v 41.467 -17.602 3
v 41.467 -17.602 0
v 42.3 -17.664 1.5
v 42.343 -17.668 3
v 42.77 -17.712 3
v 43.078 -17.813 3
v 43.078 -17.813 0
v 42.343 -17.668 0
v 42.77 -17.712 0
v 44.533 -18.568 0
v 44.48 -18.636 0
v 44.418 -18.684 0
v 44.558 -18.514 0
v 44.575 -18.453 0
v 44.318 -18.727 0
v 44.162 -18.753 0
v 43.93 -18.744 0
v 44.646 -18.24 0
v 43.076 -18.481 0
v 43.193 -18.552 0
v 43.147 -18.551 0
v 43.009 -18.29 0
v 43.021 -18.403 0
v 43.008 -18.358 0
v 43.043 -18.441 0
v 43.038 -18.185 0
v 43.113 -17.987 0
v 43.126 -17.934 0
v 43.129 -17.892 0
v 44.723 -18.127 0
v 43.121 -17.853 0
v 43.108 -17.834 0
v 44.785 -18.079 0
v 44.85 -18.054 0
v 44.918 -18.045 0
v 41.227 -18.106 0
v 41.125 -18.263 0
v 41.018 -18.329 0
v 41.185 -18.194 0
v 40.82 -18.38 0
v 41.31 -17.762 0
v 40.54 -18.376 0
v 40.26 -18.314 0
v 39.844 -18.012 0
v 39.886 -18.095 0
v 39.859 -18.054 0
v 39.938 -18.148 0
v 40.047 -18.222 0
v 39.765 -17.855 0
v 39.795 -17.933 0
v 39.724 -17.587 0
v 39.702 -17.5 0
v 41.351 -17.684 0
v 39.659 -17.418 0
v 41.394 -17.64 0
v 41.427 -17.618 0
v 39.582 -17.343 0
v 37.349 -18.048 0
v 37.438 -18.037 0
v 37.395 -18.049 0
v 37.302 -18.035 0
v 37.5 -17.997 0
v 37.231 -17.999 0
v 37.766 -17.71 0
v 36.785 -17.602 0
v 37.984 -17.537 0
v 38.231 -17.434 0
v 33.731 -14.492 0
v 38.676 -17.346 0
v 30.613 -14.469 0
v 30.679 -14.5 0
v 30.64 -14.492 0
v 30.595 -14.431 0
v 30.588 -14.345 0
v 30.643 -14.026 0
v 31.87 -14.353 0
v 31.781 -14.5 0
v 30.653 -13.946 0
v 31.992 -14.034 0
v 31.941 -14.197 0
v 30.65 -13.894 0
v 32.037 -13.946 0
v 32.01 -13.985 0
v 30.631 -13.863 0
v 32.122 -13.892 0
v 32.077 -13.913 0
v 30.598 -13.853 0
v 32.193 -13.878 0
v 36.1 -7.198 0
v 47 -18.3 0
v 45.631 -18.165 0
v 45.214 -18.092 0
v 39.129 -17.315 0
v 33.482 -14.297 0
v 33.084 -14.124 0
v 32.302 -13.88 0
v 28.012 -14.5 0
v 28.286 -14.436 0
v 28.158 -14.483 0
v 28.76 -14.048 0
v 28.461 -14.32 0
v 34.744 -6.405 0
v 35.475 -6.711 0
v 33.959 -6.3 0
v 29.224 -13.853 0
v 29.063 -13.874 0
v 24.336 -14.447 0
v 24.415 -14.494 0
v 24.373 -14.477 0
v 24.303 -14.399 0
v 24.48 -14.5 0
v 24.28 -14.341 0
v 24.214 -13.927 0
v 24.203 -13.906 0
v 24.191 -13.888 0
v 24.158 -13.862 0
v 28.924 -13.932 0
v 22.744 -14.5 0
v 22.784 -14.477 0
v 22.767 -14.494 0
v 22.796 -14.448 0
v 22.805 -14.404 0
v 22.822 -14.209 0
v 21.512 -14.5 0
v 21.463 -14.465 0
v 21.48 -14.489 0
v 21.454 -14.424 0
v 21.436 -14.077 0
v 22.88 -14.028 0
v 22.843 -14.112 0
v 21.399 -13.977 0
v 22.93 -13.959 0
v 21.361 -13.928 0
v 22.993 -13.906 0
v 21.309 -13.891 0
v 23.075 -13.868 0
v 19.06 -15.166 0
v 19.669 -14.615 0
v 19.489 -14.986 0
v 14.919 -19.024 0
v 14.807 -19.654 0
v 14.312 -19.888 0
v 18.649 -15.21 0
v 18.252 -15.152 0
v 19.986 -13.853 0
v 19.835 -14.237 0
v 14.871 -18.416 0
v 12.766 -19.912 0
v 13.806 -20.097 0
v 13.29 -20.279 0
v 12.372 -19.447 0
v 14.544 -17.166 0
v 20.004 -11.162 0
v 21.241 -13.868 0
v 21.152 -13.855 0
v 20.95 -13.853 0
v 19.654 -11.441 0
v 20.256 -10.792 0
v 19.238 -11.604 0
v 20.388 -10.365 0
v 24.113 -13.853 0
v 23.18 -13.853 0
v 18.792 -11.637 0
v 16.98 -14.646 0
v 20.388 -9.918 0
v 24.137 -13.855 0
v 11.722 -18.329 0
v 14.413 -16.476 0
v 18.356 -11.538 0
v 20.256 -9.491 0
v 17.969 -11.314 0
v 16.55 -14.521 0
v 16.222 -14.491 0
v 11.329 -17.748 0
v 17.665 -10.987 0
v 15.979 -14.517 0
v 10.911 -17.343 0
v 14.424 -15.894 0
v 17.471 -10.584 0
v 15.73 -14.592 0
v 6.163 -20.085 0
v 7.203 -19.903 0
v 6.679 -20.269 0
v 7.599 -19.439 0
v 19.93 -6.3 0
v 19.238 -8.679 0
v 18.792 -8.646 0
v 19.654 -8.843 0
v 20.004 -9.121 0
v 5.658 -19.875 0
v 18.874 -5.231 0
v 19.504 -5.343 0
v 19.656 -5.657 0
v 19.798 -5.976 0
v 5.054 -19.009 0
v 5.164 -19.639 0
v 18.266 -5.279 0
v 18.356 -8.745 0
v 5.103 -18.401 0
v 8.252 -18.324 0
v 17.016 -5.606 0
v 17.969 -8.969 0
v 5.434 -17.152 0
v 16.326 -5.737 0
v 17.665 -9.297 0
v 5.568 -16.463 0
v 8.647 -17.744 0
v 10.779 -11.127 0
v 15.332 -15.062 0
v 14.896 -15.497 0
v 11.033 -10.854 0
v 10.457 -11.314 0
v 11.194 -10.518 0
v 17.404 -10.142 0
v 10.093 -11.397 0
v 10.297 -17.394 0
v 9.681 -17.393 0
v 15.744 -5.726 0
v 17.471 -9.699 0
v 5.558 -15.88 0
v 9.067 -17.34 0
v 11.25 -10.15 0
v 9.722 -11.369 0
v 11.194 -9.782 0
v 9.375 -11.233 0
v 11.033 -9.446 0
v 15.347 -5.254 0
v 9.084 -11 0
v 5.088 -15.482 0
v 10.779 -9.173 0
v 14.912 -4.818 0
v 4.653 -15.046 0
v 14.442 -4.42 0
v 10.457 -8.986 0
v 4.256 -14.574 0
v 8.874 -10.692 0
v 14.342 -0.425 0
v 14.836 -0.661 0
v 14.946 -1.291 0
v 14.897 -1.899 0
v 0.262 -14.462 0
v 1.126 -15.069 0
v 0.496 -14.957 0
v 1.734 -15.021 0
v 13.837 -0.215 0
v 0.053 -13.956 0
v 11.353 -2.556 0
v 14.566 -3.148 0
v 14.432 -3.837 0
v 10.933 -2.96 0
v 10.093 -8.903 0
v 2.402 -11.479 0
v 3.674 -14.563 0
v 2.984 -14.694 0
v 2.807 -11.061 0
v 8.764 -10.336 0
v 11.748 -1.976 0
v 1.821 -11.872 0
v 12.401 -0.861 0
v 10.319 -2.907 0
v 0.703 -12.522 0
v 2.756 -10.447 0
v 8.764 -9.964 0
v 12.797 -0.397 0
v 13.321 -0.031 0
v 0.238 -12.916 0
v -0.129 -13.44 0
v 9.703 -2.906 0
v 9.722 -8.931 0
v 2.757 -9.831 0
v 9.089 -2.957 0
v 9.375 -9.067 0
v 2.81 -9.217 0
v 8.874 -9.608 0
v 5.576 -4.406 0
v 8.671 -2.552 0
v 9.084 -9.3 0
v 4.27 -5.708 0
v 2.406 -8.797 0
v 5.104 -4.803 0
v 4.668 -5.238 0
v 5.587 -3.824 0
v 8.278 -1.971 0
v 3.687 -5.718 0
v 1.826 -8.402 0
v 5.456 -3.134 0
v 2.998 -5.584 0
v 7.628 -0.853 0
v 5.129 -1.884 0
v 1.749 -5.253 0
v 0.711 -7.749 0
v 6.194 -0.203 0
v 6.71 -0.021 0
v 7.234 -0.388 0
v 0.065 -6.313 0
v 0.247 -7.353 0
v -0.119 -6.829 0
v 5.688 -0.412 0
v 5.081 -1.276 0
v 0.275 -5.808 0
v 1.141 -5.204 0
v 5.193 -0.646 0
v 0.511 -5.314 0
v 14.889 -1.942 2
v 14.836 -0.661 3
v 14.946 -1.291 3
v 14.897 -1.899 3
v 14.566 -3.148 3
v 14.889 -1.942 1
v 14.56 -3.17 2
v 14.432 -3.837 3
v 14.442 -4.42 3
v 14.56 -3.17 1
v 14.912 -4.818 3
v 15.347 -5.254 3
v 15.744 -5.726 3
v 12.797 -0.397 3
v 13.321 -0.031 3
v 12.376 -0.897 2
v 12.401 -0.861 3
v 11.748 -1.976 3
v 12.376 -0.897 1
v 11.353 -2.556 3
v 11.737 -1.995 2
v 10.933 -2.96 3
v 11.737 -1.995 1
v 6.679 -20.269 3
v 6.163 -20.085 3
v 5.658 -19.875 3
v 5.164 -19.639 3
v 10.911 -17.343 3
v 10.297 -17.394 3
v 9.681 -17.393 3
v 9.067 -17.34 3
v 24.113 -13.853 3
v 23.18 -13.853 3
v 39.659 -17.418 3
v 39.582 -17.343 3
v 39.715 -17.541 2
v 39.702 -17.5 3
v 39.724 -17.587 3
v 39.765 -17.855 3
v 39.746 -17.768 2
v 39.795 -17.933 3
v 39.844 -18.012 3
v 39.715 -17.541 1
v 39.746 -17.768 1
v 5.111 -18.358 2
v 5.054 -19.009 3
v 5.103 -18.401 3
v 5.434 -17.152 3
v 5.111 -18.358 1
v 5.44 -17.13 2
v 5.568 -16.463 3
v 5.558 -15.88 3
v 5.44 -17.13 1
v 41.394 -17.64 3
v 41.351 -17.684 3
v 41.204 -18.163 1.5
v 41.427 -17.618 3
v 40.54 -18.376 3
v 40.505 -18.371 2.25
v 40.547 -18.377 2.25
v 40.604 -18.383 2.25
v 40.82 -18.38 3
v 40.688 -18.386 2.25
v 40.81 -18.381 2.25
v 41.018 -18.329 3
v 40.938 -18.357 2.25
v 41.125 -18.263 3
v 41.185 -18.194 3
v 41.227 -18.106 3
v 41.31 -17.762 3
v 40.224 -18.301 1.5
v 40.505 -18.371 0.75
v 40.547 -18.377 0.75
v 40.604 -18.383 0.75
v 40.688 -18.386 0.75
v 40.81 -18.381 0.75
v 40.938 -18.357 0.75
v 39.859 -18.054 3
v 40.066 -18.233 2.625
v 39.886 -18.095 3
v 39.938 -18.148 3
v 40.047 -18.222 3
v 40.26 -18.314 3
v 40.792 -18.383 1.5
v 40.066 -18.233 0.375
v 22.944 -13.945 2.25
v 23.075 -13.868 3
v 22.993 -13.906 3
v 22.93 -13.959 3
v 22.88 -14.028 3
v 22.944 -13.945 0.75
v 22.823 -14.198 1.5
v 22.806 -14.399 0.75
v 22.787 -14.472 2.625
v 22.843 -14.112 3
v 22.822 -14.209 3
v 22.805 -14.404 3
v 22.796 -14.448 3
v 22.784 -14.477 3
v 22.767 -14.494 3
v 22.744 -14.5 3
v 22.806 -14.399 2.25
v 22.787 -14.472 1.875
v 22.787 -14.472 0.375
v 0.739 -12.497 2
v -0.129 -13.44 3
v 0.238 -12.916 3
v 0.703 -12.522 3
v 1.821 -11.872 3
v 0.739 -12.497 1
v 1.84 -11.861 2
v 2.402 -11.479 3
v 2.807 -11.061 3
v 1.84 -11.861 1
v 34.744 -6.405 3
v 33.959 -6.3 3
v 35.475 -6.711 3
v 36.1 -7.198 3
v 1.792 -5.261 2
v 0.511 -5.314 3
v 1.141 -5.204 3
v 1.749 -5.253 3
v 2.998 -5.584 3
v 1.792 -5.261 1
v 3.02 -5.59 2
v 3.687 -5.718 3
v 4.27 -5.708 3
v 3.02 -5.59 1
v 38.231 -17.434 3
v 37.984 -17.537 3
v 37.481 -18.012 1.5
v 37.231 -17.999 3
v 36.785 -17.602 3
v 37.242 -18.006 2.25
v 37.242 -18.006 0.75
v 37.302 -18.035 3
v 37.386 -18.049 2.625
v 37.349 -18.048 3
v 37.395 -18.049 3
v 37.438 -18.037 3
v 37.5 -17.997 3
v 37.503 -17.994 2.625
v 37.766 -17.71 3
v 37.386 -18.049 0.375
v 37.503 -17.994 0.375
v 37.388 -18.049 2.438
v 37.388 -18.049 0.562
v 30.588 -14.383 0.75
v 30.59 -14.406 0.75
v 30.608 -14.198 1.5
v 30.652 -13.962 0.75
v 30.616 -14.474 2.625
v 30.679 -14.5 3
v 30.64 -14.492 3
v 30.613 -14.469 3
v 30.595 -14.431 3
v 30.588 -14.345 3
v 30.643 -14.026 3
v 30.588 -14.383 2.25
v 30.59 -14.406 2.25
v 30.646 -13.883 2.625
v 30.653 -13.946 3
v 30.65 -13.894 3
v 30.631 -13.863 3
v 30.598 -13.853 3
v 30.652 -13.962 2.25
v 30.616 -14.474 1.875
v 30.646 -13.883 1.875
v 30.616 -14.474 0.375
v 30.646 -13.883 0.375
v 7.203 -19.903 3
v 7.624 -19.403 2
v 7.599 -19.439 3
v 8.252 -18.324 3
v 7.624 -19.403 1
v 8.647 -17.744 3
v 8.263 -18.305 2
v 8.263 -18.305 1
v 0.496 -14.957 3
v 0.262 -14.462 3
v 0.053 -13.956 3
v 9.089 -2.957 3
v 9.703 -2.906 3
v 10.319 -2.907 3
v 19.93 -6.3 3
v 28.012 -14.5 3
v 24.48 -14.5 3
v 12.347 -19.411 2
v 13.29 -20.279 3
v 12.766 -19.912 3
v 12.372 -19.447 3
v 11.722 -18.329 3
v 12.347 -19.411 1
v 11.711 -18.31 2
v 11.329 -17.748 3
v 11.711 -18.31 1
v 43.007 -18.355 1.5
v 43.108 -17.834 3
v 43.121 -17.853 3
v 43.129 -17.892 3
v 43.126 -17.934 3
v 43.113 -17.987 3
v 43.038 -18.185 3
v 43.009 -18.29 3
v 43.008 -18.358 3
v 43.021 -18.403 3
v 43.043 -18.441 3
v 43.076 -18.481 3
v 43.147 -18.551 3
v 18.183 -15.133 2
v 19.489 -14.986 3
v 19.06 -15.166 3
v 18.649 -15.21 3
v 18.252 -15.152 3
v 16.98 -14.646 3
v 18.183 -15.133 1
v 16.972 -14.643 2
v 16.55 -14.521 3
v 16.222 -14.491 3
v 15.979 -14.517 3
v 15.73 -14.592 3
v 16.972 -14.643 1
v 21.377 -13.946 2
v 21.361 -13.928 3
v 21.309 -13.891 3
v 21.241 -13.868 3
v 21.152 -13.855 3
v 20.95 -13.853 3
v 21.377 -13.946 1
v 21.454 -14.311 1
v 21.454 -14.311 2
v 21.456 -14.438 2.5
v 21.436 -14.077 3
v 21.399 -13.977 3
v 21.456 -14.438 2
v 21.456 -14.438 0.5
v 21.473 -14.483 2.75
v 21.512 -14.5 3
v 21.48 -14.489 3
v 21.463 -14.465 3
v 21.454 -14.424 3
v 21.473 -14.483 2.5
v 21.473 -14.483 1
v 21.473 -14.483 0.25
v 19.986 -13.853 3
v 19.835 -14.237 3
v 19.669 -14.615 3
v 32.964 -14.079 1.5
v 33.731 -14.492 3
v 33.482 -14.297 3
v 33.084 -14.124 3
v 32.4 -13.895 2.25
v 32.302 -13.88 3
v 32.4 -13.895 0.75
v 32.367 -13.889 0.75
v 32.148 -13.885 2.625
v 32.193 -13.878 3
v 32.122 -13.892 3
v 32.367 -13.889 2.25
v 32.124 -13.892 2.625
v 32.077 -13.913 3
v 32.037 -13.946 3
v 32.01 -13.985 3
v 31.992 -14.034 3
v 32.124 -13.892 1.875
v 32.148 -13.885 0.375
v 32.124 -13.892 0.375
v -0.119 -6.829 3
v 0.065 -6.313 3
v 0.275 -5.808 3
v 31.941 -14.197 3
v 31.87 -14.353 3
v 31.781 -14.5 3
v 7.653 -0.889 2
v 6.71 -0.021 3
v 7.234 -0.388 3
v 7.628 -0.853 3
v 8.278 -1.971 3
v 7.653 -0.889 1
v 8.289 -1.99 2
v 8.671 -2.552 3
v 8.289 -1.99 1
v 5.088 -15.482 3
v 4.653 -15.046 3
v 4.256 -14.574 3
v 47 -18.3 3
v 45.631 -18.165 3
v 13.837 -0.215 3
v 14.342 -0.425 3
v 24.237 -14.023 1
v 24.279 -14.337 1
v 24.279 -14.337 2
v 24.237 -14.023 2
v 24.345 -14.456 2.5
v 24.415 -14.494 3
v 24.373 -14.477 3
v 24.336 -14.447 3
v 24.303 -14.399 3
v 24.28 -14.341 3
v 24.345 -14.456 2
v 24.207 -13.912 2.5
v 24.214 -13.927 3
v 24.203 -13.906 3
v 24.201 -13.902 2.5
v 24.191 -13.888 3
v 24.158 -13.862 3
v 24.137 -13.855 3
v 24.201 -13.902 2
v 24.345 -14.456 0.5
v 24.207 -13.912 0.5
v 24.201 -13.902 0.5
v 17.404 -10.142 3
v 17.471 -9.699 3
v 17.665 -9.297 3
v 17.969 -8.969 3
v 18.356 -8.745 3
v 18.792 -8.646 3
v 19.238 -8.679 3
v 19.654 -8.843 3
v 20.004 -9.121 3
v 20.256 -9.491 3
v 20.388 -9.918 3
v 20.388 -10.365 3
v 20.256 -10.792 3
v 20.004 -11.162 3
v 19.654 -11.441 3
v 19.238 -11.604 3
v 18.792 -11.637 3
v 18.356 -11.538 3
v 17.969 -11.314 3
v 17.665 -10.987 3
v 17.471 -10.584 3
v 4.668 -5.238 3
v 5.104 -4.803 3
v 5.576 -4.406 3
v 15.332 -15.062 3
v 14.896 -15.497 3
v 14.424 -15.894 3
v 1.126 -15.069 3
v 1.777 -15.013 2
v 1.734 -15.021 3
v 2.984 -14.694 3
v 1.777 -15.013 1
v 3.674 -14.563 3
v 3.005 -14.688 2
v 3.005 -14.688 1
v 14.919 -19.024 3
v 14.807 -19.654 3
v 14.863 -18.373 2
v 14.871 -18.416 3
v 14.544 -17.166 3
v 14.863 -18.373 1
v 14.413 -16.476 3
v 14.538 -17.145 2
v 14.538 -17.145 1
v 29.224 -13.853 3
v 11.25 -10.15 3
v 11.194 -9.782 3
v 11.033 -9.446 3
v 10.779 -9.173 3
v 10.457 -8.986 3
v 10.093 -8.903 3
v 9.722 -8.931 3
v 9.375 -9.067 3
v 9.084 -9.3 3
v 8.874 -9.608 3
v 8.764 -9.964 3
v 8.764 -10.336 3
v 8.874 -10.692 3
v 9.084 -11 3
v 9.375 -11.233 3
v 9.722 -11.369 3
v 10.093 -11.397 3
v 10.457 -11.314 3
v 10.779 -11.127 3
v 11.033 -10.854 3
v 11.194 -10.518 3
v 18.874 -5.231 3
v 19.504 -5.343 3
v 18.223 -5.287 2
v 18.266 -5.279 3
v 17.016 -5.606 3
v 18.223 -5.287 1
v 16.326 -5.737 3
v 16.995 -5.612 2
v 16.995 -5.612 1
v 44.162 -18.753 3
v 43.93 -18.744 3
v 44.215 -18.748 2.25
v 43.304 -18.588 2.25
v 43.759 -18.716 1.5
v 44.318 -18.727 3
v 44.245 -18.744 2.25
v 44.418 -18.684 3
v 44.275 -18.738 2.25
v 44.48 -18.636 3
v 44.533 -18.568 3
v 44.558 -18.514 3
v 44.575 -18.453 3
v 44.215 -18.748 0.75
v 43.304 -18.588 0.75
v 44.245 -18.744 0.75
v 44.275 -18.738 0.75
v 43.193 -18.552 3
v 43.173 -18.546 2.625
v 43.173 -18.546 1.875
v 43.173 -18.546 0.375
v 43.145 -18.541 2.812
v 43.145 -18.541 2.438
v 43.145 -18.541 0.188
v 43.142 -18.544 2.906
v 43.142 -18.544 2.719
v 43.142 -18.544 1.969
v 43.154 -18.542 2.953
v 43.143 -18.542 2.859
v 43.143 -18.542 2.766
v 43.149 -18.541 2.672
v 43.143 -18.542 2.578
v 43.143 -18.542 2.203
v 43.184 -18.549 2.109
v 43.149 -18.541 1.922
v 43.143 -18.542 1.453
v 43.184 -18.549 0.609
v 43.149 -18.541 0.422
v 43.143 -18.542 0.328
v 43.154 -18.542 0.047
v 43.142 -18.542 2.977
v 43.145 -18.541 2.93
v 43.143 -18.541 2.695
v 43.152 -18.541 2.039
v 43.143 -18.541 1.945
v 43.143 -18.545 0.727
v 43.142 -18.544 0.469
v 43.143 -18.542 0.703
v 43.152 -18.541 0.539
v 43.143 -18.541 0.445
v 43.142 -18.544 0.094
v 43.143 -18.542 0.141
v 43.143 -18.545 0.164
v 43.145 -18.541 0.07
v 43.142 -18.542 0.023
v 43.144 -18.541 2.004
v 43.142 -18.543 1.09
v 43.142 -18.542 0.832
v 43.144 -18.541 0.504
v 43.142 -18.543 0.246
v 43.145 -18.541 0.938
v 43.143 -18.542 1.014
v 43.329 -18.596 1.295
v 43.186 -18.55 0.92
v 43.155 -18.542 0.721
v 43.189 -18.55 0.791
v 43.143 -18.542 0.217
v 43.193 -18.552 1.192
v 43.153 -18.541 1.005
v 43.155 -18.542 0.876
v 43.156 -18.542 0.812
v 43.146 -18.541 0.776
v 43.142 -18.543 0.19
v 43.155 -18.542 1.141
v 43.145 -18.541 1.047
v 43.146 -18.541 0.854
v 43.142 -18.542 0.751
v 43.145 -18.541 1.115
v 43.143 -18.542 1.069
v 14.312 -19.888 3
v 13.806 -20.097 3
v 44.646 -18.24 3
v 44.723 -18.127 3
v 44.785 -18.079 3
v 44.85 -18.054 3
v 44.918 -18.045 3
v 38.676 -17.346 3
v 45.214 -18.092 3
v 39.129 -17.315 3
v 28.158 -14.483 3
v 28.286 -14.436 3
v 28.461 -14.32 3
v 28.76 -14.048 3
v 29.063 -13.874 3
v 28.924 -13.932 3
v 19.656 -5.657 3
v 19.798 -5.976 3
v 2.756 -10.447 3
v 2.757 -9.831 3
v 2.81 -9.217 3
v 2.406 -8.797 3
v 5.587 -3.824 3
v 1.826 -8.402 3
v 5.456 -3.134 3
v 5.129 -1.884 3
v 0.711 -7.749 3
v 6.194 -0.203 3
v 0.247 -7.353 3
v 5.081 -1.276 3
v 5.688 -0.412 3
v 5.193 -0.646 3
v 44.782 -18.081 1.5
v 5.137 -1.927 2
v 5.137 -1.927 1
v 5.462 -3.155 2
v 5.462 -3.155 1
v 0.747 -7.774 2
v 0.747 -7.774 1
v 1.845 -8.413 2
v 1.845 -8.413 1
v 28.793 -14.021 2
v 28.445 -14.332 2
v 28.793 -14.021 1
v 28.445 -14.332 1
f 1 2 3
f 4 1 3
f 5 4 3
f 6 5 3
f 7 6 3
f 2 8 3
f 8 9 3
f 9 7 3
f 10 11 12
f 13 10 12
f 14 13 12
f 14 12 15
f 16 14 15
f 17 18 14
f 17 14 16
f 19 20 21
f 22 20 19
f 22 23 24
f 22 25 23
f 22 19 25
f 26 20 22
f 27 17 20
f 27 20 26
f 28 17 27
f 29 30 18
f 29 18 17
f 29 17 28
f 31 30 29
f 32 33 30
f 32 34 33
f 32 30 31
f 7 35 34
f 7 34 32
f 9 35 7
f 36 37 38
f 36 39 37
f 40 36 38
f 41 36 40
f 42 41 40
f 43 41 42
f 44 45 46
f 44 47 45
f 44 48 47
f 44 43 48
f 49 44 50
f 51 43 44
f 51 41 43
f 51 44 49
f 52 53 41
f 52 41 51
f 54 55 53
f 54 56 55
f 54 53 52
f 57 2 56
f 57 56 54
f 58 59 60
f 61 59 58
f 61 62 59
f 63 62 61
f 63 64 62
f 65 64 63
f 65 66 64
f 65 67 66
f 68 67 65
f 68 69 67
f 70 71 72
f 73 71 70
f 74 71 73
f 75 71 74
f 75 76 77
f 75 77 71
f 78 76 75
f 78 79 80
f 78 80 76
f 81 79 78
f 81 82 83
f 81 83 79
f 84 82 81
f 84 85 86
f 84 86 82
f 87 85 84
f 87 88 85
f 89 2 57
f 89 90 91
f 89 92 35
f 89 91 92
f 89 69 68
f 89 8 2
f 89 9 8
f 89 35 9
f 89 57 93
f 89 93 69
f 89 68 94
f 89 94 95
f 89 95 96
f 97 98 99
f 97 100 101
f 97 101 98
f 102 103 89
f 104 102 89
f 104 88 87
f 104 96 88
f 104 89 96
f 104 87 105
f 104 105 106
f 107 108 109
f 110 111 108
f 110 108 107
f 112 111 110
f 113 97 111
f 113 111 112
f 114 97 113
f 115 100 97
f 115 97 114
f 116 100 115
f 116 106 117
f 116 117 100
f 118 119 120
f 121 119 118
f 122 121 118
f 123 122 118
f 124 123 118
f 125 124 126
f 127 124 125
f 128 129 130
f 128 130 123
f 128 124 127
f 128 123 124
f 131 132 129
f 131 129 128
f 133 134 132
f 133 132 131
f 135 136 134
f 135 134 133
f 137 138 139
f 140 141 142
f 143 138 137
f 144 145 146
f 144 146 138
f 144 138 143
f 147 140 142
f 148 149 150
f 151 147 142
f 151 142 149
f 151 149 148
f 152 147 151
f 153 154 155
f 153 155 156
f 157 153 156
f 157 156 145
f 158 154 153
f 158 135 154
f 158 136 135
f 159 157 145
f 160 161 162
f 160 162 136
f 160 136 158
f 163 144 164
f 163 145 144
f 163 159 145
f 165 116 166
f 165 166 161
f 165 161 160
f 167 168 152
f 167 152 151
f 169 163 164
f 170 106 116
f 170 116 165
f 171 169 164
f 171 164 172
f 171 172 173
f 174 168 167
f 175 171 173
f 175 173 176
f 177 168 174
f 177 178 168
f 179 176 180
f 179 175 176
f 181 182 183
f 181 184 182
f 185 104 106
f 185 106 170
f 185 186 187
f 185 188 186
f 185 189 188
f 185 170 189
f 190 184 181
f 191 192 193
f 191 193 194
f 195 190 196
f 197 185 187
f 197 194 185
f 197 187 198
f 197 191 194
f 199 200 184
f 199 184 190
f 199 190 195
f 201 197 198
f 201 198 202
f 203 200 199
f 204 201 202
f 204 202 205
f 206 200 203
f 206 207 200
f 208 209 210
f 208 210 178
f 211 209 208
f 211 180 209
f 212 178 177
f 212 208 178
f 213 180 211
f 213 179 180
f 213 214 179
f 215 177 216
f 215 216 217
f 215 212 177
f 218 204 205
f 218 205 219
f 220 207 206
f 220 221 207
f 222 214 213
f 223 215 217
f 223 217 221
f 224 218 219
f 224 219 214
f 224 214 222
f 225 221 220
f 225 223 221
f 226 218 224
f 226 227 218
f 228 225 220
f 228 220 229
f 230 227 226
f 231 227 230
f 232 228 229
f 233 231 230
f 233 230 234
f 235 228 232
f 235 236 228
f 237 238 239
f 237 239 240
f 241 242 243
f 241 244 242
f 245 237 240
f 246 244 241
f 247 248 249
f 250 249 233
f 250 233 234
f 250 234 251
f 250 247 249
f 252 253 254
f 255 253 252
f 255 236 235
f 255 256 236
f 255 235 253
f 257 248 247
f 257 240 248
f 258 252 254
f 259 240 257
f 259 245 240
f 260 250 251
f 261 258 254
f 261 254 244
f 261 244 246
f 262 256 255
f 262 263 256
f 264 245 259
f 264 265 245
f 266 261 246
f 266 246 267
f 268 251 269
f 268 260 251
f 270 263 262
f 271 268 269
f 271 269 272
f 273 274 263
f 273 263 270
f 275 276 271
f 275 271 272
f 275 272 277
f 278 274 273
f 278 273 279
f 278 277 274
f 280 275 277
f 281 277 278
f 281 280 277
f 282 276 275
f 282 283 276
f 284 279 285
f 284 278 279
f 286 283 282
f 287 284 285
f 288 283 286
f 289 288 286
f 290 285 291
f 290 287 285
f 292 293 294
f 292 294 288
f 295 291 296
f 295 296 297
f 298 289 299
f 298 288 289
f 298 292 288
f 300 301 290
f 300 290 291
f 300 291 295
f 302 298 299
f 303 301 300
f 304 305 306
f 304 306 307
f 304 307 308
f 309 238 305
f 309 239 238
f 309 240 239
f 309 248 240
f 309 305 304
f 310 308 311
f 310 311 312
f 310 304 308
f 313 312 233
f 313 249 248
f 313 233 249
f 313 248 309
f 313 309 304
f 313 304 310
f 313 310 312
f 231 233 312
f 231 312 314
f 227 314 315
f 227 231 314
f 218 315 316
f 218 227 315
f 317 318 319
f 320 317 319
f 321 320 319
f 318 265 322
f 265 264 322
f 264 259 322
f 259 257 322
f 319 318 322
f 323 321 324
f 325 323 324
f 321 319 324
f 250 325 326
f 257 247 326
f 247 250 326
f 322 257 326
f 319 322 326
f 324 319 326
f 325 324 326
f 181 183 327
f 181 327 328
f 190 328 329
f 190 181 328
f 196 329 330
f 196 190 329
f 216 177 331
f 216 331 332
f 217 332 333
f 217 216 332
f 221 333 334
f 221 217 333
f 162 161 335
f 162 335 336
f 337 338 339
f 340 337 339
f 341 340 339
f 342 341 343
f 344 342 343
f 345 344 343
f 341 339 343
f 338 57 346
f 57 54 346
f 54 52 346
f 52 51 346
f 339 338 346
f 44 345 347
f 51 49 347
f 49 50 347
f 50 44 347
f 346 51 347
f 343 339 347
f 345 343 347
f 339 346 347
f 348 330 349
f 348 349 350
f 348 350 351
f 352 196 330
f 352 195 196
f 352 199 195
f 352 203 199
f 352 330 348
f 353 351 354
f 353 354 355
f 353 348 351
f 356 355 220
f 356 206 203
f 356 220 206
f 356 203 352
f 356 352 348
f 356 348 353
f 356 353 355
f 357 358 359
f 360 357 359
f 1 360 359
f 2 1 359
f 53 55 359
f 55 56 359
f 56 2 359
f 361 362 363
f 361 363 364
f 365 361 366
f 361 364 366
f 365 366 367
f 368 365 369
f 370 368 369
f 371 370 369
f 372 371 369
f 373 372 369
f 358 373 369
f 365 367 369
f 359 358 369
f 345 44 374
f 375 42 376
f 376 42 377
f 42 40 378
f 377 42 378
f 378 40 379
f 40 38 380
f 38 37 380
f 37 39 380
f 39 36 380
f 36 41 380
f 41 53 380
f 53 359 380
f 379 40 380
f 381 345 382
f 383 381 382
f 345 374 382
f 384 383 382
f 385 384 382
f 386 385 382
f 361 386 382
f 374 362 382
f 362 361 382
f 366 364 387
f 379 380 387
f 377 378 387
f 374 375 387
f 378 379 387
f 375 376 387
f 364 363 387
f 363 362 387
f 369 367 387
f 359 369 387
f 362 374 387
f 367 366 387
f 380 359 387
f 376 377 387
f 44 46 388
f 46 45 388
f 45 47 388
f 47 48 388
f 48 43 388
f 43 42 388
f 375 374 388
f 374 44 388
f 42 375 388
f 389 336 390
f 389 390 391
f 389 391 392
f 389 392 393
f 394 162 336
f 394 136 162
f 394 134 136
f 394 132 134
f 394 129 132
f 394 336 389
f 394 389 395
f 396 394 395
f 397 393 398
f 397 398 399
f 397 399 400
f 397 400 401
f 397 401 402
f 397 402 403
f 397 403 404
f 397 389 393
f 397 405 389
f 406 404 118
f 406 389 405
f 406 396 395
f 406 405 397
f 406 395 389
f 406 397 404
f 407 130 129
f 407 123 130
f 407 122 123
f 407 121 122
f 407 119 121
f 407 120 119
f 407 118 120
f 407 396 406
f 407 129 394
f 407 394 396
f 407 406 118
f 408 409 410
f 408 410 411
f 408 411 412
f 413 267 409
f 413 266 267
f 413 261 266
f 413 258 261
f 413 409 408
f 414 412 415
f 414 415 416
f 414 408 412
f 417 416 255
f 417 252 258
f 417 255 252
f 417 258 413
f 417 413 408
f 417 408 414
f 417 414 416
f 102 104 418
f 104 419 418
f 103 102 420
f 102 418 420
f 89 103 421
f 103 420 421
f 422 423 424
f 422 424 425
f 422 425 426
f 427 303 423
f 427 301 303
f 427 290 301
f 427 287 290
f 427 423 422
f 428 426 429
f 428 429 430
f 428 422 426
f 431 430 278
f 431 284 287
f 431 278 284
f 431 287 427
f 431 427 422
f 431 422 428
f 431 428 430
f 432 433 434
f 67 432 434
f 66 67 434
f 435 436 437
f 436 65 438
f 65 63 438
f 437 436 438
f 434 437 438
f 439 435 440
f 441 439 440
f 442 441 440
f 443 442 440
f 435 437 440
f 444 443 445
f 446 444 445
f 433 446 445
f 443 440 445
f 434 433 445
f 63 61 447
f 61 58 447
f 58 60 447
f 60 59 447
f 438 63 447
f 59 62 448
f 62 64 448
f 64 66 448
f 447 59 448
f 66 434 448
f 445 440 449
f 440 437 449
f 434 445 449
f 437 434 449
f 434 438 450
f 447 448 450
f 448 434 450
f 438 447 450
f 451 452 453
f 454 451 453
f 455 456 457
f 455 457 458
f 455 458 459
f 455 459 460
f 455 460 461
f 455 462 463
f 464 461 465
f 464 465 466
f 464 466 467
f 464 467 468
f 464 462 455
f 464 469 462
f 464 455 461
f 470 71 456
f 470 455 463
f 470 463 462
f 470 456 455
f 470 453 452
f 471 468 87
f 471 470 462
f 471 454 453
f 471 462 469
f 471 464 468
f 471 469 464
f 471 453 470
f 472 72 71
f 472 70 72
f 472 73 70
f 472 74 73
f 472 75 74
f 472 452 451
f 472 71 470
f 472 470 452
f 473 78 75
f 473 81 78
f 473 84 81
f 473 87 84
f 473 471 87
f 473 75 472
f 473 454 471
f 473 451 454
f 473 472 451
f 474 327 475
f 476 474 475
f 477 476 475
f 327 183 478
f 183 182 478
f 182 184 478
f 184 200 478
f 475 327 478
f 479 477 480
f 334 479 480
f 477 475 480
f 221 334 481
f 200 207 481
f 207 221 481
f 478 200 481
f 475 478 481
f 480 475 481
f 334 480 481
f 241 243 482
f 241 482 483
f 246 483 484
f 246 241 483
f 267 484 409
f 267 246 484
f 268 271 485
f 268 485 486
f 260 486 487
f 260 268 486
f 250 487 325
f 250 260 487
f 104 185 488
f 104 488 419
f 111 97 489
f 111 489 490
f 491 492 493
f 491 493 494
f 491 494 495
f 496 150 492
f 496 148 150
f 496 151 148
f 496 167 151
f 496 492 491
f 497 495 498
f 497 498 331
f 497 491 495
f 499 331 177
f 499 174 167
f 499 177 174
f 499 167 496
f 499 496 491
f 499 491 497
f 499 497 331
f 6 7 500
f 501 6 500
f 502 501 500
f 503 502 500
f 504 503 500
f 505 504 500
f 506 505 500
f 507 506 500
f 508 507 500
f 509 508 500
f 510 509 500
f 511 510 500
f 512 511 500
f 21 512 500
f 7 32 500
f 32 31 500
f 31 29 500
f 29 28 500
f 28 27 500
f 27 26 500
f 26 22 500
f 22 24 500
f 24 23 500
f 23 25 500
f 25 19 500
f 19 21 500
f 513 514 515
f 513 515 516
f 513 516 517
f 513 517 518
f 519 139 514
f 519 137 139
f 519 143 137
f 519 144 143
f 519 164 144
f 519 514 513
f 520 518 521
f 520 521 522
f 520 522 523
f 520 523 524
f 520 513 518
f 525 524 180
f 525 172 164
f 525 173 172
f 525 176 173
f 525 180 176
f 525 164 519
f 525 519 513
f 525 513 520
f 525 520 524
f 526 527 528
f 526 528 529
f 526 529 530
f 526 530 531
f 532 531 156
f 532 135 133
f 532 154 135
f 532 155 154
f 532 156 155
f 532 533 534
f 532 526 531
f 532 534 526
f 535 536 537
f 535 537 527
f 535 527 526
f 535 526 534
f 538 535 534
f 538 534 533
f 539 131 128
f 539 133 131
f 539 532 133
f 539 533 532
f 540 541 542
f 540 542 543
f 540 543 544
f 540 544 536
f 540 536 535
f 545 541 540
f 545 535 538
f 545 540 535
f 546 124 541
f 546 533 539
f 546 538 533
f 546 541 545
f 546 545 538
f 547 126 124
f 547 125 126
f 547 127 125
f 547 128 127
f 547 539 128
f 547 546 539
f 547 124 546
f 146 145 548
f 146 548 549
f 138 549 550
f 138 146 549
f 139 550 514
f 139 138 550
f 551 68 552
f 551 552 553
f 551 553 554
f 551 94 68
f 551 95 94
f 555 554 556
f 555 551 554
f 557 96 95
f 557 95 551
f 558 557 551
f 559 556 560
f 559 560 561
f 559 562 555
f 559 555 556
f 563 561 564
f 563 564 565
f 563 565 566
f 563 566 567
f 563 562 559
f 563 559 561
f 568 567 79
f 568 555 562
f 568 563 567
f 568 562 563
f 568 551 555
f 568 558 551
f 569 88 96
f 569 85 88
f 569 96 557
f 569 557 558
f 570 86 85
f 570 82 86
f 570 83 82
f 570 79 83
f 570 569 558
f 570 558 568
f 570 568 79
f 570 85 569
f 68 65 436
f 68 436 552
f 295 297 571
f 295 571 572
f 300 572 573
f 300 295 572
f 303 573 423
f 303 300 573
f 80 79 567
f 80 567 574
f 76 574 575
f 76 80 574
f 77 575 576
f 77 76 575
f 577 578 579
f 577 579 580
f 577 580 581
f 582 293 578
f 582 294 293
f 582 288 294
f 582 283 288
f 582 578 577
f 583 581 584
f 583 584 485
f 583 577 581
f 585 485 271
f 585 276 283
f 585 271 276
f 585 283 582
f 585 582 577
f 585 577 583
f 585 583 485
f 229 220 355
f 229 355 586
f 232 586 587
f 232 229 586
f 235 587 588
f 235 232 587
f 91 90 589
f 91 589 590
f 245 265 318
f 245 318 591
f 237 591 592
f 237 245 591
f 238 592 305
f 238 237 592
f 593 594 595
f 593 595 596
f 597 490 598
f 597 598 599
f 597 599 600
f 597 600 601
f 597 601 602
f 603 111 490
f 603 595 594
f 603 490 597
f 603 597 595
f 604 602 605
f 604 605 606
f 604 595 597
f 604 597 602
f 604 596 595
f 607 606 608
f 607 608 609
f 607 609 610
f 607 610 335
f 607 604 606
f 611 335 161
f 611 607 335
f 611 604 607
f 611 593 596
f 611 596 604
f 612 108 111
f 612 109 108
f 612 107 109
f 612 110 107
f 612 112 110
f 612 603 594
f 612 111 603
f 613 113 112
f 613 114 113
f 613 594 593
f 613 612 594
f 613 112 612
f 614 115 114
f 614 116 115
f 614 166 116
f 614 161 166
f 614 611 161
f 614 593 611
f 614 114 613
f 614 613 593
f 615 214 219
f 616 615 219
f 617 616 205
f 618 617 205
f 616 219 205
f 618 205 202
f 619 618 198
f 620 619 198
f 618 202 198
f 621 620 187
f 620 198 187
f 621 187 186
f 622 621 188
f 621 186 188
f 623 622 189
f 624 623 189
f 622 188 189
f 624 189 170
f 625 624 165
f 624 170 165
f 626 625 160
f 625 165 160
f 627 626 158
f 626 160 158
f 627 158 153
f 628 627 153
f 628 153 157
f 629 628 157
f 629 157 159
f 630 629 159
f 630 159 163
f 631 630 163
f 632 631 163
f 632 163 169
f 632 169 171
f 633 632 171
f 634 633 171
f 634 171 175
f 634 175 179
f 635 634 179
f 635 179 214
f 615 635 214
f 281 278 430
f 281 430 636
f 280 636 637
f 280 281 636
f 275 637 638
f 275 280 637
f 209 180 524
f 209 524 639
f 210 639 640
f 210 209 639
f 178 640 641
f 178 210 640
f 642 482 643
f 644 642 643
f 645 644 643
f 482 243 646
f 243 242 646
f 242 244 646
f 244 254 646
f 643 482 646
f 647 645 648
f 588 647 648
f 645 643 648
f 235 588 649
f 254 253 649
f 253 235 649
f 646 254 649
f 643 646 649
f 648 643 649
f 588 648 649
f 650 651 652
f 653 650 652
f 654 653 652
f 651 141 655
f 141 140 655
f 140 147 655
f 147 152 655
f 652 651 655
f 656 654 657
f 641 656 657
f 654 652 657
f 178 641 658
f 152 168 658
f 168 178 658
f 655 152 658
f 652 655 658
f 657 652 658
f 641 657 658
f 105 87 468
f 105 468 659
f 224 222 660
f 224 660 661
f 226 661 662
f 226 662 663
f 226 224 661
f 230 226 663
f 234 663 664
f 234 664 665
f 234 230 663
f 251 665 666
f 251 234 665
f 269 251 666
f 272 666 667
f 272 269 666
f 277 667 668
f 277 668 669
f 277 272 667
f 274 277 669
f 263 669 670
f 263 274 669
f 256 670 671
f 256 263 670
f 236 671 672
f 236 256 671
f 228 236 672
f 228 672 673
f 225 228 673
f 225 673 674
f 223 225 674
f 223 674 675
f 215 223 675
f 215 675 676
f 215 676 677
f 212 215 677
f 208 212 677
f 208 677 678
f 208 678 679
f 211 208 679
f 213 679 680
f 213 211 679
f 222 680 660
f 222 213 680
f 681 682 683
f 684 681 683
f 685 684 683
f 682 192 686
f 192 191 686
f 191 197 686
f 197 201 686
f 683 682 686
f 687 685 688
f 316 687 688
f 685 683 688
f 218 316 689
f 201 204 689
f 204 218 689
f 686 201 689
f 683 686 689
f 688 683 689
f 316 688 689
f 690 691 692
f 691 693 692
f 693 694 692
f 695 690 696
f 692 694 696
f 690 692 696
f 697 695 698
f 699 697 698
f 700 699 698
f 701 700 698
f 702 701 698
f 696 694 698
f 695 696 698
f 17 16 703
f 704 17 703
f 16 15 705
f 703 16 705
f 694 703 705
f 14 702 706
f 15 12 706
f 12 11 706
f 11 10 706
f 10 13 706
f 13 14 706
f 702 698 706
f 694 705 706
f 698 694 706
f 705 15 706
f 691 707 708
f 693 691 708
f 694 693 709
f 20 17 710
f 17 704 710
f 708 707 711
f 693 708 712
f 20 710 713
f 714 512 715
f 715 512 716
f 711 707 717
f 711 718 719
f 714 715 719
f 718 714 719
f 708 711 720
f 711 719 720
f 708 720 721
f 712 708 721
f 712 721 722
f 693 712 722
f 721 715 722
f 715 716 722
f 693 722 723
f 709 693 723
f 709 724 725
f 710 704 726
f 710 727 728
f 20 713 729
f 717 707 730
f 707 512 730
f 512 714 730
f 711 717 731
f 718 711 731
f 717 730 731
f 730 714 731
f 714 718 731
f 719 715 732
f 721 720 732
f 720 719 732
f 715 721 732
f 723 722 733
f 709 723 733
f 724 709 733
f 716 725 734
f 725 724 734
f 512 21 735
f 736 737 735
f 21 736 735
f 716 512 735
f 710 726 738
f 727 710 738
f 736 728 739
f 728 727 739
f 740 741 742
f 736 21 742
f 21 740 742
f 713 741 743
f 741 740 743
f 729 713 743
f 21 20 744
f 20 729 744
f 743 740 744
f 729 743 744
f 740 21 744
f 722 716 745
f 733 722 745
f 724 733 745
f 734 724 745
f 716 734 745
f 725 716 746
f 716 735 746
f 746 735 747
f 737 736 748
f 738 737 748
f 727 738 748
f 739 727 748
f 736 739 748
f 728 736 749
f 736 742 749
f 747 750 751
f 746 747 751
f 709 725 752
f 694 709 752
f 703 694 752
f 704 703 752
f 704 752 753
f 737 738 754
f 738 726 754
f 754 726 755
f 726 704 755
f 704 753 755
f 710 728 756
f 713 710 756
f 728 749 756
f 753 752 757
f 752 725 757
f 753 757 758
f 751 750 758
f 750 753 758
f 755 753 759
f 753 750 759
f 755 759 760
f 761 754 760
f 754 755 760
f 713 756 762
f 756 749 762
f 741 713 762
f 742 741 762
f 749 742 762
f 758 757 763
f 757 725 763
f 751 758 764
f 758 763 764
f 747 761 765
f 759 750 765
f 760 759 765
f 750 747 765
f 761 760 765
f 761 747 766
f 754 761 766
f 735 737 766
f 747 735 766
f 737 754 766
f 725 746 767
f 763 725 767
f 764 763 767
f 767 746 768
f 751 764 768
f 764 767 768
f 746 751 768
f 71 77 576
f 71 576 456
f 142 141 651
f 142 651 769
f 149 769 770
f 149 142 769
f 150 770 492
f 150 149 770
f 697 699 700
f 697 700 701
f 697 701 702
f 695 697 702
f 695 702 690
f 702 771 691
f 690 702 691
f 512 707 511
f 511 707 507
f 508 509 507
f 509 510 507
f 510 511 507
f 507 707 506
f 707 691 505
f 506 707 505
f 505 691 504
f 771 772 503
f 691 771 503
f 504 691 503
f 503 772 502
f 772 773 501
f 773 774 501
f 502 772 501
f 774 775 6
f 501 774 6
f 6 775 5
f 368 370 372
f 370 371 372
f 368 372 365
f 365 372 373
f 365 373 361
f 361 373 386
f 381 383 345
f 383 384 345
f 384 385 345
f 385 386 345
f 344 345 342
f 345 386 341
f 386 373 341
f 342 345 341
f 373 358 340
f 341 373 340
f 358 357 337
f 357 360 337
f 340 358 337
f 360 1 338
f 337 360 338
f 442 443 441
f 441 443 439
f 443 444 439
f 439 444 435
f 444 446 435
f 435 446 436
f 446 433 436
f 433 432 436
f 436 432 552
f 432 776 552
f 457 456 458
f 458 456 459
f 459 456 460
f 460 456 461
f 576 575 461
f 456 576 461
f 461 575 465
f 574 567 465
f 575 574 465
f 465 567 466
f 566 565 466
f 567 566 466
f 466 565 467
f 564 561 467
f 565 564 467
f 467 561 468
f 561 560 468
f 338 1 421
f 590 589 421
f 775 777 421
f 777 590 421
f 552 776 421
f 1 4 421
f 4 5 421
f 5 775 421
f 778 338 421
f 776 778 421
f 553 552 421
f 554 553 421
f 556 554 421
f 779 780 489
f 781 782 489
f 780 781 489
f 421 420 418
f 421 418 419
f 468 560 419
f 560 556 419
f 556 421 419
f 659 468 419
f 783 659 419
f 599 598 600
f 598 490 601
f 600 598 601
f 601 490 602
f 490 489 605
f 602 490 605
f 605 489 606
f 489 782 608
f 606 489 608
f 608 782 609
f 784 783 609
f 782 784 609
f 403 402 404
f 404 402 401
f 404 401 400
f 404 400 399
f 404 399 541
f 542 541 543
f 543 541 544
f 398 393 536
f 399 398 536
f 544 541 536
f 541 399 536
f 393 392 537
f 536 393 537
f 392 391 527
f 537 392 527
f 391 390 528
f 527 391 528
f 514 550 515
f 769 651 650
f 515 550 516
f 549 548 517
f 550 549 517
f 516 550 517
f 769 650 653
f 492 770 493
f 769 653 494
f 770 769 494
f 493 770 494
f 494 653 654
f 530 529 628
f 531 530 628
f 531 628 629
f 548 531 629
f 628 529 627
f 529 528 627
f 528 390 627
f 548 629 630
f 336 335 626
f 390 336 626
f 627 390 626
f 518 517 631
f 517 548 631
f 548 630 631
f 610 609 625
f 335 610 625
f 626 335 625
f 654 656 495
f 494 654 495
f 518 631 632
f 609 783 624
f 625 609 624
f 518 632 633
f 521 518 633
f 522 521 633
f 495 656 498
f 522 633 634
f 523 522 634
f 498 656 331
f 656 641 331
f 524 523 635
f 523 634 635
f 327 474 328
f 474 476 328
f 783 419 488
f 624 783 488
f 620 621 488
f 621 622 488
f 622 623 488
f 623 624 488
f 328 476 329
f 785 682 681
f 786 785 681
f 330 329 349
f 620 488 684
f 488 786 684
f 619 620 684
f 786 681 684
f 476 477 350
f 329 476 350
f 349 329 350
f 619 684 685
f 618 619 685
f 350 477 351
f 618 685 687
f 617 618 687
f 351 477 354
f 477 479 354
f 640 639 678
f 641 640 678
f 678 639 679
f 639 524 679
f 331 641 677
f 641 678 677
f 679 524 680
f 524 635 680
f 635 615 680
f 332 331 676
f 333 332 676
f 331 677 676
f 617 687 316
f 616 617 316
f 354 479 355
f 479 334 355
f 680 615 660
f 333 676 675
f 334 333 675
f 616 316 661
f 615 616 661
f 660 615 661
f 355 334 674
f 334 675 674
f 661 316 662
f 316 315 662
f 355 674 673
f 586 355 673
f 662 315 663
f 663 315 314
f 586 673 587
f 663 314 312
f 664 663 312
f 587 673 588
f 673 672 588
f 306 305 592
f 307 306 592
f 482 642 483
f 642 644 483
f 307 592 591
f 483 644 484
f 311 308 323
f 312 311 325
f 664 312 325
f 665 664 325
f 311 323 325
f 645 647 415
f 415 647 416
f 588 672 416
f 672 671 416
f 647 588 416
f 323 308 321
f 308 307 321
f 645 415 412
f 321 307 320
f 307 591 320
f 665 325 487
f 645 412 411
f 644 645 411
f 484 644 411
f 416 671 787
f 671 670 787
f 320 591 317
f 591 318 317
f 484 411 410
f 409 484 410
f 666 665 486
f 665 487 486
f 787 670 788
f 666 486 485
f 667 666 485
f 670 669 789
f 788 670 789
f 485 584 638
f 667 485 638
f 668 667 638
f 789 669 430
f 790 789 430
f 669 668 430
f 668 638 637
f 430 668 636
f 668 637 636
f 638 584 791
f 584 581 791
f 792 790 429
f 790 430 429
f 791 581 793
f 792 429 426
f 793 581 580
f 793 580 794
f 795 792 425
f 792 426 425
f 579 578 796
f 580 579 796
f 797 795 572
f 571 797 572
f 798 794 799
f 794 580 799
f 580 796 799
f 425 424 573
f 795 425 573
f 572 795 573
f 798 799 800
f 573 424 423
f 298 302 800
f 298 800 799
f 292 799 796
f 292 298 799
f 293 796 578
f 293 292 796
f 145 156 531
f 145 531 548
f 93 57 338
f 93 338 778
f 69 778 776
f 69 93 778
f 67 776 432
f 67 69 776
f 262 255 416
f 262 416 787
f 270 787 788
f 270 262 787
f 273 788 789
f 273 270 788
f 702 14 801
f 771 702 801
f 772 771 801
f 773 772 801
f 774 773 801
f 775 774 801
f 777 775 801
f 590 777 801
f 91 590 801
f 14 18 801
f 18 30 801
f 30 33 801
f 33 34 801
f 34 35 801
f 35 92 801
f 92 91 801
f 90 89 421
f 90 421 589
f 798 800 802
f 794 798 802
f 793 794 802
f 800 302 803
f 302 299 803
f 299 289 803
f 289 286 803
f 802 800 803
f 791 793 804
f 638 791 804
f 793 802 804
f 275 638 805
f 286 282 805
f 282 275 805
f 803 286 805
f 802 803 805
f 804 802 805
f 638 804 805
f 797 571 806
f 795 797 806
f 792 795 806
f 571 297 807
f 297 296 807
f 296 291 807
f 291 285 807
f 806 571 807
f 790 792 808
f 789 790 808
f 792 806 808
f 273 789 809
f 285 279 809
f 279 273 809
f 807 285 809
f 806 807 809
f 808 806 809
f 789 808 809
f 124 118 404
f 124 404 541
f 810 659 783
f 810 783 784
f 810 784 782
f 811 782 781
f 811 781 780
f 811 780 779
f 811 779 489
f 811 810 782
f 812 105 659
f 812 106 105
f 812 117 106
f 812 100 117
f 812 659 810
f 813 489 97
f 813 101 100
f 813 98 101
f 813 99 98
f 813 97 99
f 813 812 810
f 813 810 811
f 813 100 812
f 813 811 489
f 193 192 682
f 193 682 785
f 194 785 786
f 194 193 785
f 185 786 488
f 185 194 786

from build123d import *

# Parameters (mm, degrees)
ESQUISSE1_R             = 1.25
BOSS_EXTRU_1_DEPTH      = 3
CONG_1_R                = 3
ESQUISSE2_R             = 1.5
ENL_V_MAT_EXTRU_1_DEPTH = 10


with BuildPart() as part:
    # Esquisse1 → Boss.-Extru.1 (new body)
    with BuildSketch(Plane.XY):
        with BuildLine():
            Line((19.92975327, -6.3), (35.217971298, -6.3))
            Line((35.217971298, -6.3), (47, -18.3))
            Line((47, -18.3), (45.631202596, -18.164866086))
            add(Edge.make_bspline(
                [(44.574765673, -18.453081845), (44.609849099, -18.278093463), (44.810570852, -17.89677836), (45.205219796, -18.122811123), (45.631202596, -18.164866086)],
                knots=[0, 0, 0, 0, 0.363922375, 1, 1, 1, 1], degree=3))
            add(Edge.make_bspline(
                [(43.14719525, -18.550945105), (43.09751522, -18.50205817), (43.730894007, -18.788269797), (44.507224039, -18.789964599), (44.574765673, -18.453081845)],
                knots=[0, 0, 0, 0, 0.494582685, 1, 1, 1, 1], degree=3))
            add(Edge.make_bspline(
                [(43.078110836, -17.813160677), (43.233086748, -17.882249489), (42.868812221, -18.319185258), (43.087477408, -18.492180602), (43.14719525, -18.550945105)],
                knots=[0, 0, 0, 0, 0.680948688, 1, 1, 1, 1], degree=3))
            add(Edge.make_bspline(
                [(41.466586273, -17.601888285), (41.504069337, -17.589909306), (42.505756712, -17.693836279), (42.799520207, -17.688963985), (43.078110836, -17.813160677)],
                knots=[0, 0, 0, 0, 0.477700623, 1, 1, 1, 1], degree=3))
            add(Edge.make_bspline(
                [(39.844270523, -18.01177052), (39.904616243, -18.313831866), (41.426666849, -18.718352059), (41.243571394, -17.673160221), (41.466586273, -17.601888285)],
                knots=[0, 0, 0, 0, 0.705660207, 1, 1, 1, 1], degree=3))
            add(Edge.make_bspline(
                [(39.582059604, -17.342538581), (39.82174321, -17.521996239), (39.65531727, -17.763700919), (39.844270523, -18.01177052)],
                knots=[0, 0, 0, 0, 1, 1, 1, 1], degree=3))
            ThreePointArc((39.582059604, -17.342538581), (38.901892941, -17.323195475), (38.230573756, -17.434242297))
            add(Edge.make_bspline(
                [(36.784856269, -17.601888285), (37.210480557, -18.035386759), (37.505799664, -18.195146881), (37.795231884, -17.550105131), (38.230573756, -17.434242297)],
                knots=[0, 0, 0, 0, 0.460710551, 1, 1, 1, 1], degree=3))
            Line((36.784856269, -17.601888285), (33.731487311, -14.492031025))
            add(Edge.make_bspline(
                [(33.731487311, -14.492031025), (33.514450956, -14.270979429), (33.057221931, -14.130586993), (32.069360868, -13.726488082), (31.99227695, -14.033778698)],
                knots=[0, 0, 0, 0, 0.472738977, 1, 1, 1, 1], degree=3))
            ThreePointArc((31.99227695, -14.033778698), (31.907533679, -14.27645853), (31.780631614, -14.5))
            Line((31.780631614, -14.5), (30.678819449, -14.5))
            add(Edge.make_bspline(
                [(30.678819449, -14.5), (30.566879888, -14.5), (30.590912004, -14.184943581), (30.696767567, -13.852950327), (30.597609057, -13.852950327)],
                knots=[0, 0, 0, 0, 0.4739837, 1, 1, 1, 1], degree=3))
            Line((30.597609057, -13.852950327), (29.223744999, -13.852950327))
            add(Edge.make_bspline(
                [(29.223744999, -13.852950327), (28.69642769, -13.852950327), (28.543913483, -14.5), (28.011775663, -14.5)],
                knots=[0, 0, 0, 0, 1, 1, 1, 1], degree=3))
            Line((28.011775663, -14.5), (24.480450971, -14.5))
            add(Edge.make_bspline(
                [(24.480450971, -14.5), (24.119134276, -14.511094497), (24.35906075, -13.852950327), (24.113474847, -13.852950327)],
                knots=[0, 0, 0, 0, 0.869021917, 0.869021917, 0.869021917, 0.869021917], degree=3))
            Line((24.113474847, -13.852950327), (23.179553753, -13.852950327))
            add(Edge.make_bspline(
                [(23.179553753, -13.852950327), (22.992119455, -13.852950327), (22.770536848, -14.066530423), (22.823007832, -14.5), (22.744283986, -14.5)],
                knots=[0, 0, 0, 0, 0.61315008, 1, 1, 1, 1], degree=3))
            Line((22.744283986, -14.5), (21.51212894, -14.5))
            add(Edge.make_bspline(
                [(21.51212894, -14.5), (21.442415292, -14.5), (21.471474766, -14.175360412), (21.388427589, -13.83637058), (21.143014821, -13.852950327), (20.950444947, -13.852950327)],
                knots=[0, 0, 0, 0, 0.152029745, 0.482763063, 1, 1, 1, 1], degree=3))
            Line((20.950444947, -13.852950327), (19.985522464, -13.852950327))
            ThreePointArc((19.985522464, -13.852950327), (19.75349781, -14.426889112), (19.488517244, -14.986376796))
            add(Edge.make_bspline(
                [(19.488517244, -14.986376796), (18.093314004, -15.809671906), (17.029637143, -14.066327863), (15.730054573, -14.591731036)],
                knots=[0, 0, 0, 0, 1, 1, 1, 1], degree=3))
            ThreePointArc((15.730054573, -14.591731036), (15.118510747, -15.284525074), (14.42380974, -15.893901756))
            add(Edge.make_bspline(
                [(14.806712838, -19.653578889), (15.250545236, -18.321985455), (14.236323883, -17.180609482), (14.42380974, -15.893901756)],
                knots=[0, 0, 0, 0, 1, 1, 1, 1], degree=3))
            ThreePointArc((14.806712838, -19.653578889), (14.060205467, -19.995670702), (13.289560057, -20.279229716))
            add(Edge.make_bspline(
                [(13.289560057, -20.279229716), (12.036111486, -19.647569245), (11.950961464, -18.123058328), (10.910982309, -17.342538581)],
                knots=[0, 0, 0, 0, 1, 1, 1, 1], degree=3))
            ThreePointArc((10.910982309, -17.342538581), (9.988676161, -17.399991157), (9.066553984, -17.339657748))
            add(Edge.make_bspline(
                [(6.678814165, -20.268904321), (7.93422981, -19.641162472), (8.024141705, -18.116924986), (9.066553984, -17.339657748)],
                knots=[0, 0, 0, 0, 1, 1, 1, 1], degree=3))
            ThreePointArc((6.678814165, -20.268904321), (5.909058301, -19.982939337), (5.163623204, -19.638517244))
            add(Edge.make_bspline(
                [(5.163623204, -19.638517244), (4.723952621, -18.305543857), (5.74173447, -17.167341691), (5.558268964, -15.880054573)],
                knots=[0, 0, 0, 0, 1, 1, 1, 1], degree=3))
            ThreePointArc((5.558268964, -15.880054573), (4.865474926, -15.268510747), (4.256098244, -14.573809741))
            add(Edge.make_bspline(
                [(0.496421111, -14.956712838), (1.828014545, -15.400545236), (2.969390518, -14.386323883), (4.256098244, -14.573809741)],
                knots=[0, 0, 0, 0, 1, 1, 1, 1], degree=3))
            ThreePointArc((0.496421111, -14.956712838), (0.154329299, -14.210205467), (-0.129229715, -13.439560057))
            add(Edge.make_bspline(
                [(-0.129229715, -13.439560057), (0.502430755, -12.186111486), (2.026941672, -12.100961464), (2.807461419, -11.060982309)],
                knots=[0, 0, 0, 0, 1, 1, 1, 1], degree=3))
            ThreePointArc((2.807461419, -11.060982309), (2.750008843, -10.138676161), (2.810342252, -9.216553984))
            add(Edge.make_bspline(
                [(-0.118904321, -6.828814165), (0.508837528, -8.08422981), (2.033075015, -8.174141705), (2.810342252, -9.216553984)],
                knots=[0, 0, 0, 0, 1, 1, 1, 1], degree=3))
            ThreePointArc((-0.118904321, -6.828814165), (0.167060663, -6.059058301), (0.511482756, -5.313623204))
            add(Edge.make_bspline(
                [(0.511482756, -5.313623204), (1.844456143, -4.873952621), (2.982658309, -5.89173447), (4.269945427, -5.708268964)],
                knots=[0, 0, 0, 0, 1, 1, 1, 1], degree=3))
            ThreePointArc((4.269945427, -5.708268964), (4.881489253, -5.015474926), (5.57619026, -4.406098244))
            add(Edge.make_bspline(
                [(5.193287162, -0.646421111), (4.749454764, -1.978014545), (5.763676116, -3.119390518), (5.57619026, -4.406098244)],
                knots=[0, 0, 0, 0, 1, 1, 1, 1], degree=3))
            ThreePointArc((5.193287162, -0.646421111), (5.939794533, -0.304329298), (6.710439943, -0.020770284))
            add(Edge.make_bspline(
                [(6.710439943, -0.020770284), (7.963888514, -0.652430755), (8.049038536, -2.176941672), (9.089017691, -2.957461419)],
                knots=[0, 0, 0, 0, 1, 1, 1, 1], degree=3))
            ThreePointArc((9.089017691, -2.957461419), (10.011323839, -2.900008843), (10.933446016, -2.960342252))
            add(Edge.make_bspline(
                [(13.321185835, -0.031095679), (12.06577019, -0.658837528), (11.975858295, -2.183075014), (10.933446016, -2.960342252)],
                knots=[0, 0, 0, 0, 1, 1, 1, 1], degree=3))
            ThreePointArc((13.321185835, -0.031095679), (14.0909417, -0.317060663), (14.836376797, -0.661482756))
            add(Edge.make_bspline(
                [(14.836376797, -0.661482756), (15.276047379, -1.994456143), (14.25826553, -3.132658309), (14.441731036, -4.419945428)],
                knots=[0, 0, 0, 0, 1, 1, 1, 1], degree=3))
            ThreePointArc((14.441731036, -4.419945428), (15.134525074, -5.031489253), (15.743901756, -5.72619026))
            add(Edge.make_bspline(
                [(19.503578889, -5.343287162), (18.171985455, -4.899454764), (17.030609482, -5.913676116), (15.743901756, -5.72619026)],
                knots=[0, 0, 0, 0, 1, 1, 1, 1], degree=3))
            ThreePointArc((19.503578889, -5.343287162), (19.728433818, -5.81640156), (19.92975327, -6.3))
        make_face()
        with Locations((10, -10.15)):
            Circle(ESQUISSE1_R, mode=Mode.SUBTRACT)
    extrude(amount=BOSS_EXTRU_1_DEPTH)

    # Congé1
    cong_1_edges = [part.edges().sort_by_distance(p)[0] for p in [
        (35.217971298, -6.3, 1.5),
    ]]
    fillet(cong_1_edges, radius=CONG_1_R)

    # Esquisse2 → Enlèv. mat.-Extru.1 (cut)
    with BuildSketch(Plane(origin=(0, 0, 0), x_dir=(-1, 0, 0), z_dir=(0, 0, -1))):
        with Locations((-18.904357786, -10.141593779)):
            Circle(ESQUISSE2_R)
    extrude(amount=-ENL_V_MAT_EXTRU_1_DEPTH, mode=Mode.SUBTRACT)


solid = part.part
